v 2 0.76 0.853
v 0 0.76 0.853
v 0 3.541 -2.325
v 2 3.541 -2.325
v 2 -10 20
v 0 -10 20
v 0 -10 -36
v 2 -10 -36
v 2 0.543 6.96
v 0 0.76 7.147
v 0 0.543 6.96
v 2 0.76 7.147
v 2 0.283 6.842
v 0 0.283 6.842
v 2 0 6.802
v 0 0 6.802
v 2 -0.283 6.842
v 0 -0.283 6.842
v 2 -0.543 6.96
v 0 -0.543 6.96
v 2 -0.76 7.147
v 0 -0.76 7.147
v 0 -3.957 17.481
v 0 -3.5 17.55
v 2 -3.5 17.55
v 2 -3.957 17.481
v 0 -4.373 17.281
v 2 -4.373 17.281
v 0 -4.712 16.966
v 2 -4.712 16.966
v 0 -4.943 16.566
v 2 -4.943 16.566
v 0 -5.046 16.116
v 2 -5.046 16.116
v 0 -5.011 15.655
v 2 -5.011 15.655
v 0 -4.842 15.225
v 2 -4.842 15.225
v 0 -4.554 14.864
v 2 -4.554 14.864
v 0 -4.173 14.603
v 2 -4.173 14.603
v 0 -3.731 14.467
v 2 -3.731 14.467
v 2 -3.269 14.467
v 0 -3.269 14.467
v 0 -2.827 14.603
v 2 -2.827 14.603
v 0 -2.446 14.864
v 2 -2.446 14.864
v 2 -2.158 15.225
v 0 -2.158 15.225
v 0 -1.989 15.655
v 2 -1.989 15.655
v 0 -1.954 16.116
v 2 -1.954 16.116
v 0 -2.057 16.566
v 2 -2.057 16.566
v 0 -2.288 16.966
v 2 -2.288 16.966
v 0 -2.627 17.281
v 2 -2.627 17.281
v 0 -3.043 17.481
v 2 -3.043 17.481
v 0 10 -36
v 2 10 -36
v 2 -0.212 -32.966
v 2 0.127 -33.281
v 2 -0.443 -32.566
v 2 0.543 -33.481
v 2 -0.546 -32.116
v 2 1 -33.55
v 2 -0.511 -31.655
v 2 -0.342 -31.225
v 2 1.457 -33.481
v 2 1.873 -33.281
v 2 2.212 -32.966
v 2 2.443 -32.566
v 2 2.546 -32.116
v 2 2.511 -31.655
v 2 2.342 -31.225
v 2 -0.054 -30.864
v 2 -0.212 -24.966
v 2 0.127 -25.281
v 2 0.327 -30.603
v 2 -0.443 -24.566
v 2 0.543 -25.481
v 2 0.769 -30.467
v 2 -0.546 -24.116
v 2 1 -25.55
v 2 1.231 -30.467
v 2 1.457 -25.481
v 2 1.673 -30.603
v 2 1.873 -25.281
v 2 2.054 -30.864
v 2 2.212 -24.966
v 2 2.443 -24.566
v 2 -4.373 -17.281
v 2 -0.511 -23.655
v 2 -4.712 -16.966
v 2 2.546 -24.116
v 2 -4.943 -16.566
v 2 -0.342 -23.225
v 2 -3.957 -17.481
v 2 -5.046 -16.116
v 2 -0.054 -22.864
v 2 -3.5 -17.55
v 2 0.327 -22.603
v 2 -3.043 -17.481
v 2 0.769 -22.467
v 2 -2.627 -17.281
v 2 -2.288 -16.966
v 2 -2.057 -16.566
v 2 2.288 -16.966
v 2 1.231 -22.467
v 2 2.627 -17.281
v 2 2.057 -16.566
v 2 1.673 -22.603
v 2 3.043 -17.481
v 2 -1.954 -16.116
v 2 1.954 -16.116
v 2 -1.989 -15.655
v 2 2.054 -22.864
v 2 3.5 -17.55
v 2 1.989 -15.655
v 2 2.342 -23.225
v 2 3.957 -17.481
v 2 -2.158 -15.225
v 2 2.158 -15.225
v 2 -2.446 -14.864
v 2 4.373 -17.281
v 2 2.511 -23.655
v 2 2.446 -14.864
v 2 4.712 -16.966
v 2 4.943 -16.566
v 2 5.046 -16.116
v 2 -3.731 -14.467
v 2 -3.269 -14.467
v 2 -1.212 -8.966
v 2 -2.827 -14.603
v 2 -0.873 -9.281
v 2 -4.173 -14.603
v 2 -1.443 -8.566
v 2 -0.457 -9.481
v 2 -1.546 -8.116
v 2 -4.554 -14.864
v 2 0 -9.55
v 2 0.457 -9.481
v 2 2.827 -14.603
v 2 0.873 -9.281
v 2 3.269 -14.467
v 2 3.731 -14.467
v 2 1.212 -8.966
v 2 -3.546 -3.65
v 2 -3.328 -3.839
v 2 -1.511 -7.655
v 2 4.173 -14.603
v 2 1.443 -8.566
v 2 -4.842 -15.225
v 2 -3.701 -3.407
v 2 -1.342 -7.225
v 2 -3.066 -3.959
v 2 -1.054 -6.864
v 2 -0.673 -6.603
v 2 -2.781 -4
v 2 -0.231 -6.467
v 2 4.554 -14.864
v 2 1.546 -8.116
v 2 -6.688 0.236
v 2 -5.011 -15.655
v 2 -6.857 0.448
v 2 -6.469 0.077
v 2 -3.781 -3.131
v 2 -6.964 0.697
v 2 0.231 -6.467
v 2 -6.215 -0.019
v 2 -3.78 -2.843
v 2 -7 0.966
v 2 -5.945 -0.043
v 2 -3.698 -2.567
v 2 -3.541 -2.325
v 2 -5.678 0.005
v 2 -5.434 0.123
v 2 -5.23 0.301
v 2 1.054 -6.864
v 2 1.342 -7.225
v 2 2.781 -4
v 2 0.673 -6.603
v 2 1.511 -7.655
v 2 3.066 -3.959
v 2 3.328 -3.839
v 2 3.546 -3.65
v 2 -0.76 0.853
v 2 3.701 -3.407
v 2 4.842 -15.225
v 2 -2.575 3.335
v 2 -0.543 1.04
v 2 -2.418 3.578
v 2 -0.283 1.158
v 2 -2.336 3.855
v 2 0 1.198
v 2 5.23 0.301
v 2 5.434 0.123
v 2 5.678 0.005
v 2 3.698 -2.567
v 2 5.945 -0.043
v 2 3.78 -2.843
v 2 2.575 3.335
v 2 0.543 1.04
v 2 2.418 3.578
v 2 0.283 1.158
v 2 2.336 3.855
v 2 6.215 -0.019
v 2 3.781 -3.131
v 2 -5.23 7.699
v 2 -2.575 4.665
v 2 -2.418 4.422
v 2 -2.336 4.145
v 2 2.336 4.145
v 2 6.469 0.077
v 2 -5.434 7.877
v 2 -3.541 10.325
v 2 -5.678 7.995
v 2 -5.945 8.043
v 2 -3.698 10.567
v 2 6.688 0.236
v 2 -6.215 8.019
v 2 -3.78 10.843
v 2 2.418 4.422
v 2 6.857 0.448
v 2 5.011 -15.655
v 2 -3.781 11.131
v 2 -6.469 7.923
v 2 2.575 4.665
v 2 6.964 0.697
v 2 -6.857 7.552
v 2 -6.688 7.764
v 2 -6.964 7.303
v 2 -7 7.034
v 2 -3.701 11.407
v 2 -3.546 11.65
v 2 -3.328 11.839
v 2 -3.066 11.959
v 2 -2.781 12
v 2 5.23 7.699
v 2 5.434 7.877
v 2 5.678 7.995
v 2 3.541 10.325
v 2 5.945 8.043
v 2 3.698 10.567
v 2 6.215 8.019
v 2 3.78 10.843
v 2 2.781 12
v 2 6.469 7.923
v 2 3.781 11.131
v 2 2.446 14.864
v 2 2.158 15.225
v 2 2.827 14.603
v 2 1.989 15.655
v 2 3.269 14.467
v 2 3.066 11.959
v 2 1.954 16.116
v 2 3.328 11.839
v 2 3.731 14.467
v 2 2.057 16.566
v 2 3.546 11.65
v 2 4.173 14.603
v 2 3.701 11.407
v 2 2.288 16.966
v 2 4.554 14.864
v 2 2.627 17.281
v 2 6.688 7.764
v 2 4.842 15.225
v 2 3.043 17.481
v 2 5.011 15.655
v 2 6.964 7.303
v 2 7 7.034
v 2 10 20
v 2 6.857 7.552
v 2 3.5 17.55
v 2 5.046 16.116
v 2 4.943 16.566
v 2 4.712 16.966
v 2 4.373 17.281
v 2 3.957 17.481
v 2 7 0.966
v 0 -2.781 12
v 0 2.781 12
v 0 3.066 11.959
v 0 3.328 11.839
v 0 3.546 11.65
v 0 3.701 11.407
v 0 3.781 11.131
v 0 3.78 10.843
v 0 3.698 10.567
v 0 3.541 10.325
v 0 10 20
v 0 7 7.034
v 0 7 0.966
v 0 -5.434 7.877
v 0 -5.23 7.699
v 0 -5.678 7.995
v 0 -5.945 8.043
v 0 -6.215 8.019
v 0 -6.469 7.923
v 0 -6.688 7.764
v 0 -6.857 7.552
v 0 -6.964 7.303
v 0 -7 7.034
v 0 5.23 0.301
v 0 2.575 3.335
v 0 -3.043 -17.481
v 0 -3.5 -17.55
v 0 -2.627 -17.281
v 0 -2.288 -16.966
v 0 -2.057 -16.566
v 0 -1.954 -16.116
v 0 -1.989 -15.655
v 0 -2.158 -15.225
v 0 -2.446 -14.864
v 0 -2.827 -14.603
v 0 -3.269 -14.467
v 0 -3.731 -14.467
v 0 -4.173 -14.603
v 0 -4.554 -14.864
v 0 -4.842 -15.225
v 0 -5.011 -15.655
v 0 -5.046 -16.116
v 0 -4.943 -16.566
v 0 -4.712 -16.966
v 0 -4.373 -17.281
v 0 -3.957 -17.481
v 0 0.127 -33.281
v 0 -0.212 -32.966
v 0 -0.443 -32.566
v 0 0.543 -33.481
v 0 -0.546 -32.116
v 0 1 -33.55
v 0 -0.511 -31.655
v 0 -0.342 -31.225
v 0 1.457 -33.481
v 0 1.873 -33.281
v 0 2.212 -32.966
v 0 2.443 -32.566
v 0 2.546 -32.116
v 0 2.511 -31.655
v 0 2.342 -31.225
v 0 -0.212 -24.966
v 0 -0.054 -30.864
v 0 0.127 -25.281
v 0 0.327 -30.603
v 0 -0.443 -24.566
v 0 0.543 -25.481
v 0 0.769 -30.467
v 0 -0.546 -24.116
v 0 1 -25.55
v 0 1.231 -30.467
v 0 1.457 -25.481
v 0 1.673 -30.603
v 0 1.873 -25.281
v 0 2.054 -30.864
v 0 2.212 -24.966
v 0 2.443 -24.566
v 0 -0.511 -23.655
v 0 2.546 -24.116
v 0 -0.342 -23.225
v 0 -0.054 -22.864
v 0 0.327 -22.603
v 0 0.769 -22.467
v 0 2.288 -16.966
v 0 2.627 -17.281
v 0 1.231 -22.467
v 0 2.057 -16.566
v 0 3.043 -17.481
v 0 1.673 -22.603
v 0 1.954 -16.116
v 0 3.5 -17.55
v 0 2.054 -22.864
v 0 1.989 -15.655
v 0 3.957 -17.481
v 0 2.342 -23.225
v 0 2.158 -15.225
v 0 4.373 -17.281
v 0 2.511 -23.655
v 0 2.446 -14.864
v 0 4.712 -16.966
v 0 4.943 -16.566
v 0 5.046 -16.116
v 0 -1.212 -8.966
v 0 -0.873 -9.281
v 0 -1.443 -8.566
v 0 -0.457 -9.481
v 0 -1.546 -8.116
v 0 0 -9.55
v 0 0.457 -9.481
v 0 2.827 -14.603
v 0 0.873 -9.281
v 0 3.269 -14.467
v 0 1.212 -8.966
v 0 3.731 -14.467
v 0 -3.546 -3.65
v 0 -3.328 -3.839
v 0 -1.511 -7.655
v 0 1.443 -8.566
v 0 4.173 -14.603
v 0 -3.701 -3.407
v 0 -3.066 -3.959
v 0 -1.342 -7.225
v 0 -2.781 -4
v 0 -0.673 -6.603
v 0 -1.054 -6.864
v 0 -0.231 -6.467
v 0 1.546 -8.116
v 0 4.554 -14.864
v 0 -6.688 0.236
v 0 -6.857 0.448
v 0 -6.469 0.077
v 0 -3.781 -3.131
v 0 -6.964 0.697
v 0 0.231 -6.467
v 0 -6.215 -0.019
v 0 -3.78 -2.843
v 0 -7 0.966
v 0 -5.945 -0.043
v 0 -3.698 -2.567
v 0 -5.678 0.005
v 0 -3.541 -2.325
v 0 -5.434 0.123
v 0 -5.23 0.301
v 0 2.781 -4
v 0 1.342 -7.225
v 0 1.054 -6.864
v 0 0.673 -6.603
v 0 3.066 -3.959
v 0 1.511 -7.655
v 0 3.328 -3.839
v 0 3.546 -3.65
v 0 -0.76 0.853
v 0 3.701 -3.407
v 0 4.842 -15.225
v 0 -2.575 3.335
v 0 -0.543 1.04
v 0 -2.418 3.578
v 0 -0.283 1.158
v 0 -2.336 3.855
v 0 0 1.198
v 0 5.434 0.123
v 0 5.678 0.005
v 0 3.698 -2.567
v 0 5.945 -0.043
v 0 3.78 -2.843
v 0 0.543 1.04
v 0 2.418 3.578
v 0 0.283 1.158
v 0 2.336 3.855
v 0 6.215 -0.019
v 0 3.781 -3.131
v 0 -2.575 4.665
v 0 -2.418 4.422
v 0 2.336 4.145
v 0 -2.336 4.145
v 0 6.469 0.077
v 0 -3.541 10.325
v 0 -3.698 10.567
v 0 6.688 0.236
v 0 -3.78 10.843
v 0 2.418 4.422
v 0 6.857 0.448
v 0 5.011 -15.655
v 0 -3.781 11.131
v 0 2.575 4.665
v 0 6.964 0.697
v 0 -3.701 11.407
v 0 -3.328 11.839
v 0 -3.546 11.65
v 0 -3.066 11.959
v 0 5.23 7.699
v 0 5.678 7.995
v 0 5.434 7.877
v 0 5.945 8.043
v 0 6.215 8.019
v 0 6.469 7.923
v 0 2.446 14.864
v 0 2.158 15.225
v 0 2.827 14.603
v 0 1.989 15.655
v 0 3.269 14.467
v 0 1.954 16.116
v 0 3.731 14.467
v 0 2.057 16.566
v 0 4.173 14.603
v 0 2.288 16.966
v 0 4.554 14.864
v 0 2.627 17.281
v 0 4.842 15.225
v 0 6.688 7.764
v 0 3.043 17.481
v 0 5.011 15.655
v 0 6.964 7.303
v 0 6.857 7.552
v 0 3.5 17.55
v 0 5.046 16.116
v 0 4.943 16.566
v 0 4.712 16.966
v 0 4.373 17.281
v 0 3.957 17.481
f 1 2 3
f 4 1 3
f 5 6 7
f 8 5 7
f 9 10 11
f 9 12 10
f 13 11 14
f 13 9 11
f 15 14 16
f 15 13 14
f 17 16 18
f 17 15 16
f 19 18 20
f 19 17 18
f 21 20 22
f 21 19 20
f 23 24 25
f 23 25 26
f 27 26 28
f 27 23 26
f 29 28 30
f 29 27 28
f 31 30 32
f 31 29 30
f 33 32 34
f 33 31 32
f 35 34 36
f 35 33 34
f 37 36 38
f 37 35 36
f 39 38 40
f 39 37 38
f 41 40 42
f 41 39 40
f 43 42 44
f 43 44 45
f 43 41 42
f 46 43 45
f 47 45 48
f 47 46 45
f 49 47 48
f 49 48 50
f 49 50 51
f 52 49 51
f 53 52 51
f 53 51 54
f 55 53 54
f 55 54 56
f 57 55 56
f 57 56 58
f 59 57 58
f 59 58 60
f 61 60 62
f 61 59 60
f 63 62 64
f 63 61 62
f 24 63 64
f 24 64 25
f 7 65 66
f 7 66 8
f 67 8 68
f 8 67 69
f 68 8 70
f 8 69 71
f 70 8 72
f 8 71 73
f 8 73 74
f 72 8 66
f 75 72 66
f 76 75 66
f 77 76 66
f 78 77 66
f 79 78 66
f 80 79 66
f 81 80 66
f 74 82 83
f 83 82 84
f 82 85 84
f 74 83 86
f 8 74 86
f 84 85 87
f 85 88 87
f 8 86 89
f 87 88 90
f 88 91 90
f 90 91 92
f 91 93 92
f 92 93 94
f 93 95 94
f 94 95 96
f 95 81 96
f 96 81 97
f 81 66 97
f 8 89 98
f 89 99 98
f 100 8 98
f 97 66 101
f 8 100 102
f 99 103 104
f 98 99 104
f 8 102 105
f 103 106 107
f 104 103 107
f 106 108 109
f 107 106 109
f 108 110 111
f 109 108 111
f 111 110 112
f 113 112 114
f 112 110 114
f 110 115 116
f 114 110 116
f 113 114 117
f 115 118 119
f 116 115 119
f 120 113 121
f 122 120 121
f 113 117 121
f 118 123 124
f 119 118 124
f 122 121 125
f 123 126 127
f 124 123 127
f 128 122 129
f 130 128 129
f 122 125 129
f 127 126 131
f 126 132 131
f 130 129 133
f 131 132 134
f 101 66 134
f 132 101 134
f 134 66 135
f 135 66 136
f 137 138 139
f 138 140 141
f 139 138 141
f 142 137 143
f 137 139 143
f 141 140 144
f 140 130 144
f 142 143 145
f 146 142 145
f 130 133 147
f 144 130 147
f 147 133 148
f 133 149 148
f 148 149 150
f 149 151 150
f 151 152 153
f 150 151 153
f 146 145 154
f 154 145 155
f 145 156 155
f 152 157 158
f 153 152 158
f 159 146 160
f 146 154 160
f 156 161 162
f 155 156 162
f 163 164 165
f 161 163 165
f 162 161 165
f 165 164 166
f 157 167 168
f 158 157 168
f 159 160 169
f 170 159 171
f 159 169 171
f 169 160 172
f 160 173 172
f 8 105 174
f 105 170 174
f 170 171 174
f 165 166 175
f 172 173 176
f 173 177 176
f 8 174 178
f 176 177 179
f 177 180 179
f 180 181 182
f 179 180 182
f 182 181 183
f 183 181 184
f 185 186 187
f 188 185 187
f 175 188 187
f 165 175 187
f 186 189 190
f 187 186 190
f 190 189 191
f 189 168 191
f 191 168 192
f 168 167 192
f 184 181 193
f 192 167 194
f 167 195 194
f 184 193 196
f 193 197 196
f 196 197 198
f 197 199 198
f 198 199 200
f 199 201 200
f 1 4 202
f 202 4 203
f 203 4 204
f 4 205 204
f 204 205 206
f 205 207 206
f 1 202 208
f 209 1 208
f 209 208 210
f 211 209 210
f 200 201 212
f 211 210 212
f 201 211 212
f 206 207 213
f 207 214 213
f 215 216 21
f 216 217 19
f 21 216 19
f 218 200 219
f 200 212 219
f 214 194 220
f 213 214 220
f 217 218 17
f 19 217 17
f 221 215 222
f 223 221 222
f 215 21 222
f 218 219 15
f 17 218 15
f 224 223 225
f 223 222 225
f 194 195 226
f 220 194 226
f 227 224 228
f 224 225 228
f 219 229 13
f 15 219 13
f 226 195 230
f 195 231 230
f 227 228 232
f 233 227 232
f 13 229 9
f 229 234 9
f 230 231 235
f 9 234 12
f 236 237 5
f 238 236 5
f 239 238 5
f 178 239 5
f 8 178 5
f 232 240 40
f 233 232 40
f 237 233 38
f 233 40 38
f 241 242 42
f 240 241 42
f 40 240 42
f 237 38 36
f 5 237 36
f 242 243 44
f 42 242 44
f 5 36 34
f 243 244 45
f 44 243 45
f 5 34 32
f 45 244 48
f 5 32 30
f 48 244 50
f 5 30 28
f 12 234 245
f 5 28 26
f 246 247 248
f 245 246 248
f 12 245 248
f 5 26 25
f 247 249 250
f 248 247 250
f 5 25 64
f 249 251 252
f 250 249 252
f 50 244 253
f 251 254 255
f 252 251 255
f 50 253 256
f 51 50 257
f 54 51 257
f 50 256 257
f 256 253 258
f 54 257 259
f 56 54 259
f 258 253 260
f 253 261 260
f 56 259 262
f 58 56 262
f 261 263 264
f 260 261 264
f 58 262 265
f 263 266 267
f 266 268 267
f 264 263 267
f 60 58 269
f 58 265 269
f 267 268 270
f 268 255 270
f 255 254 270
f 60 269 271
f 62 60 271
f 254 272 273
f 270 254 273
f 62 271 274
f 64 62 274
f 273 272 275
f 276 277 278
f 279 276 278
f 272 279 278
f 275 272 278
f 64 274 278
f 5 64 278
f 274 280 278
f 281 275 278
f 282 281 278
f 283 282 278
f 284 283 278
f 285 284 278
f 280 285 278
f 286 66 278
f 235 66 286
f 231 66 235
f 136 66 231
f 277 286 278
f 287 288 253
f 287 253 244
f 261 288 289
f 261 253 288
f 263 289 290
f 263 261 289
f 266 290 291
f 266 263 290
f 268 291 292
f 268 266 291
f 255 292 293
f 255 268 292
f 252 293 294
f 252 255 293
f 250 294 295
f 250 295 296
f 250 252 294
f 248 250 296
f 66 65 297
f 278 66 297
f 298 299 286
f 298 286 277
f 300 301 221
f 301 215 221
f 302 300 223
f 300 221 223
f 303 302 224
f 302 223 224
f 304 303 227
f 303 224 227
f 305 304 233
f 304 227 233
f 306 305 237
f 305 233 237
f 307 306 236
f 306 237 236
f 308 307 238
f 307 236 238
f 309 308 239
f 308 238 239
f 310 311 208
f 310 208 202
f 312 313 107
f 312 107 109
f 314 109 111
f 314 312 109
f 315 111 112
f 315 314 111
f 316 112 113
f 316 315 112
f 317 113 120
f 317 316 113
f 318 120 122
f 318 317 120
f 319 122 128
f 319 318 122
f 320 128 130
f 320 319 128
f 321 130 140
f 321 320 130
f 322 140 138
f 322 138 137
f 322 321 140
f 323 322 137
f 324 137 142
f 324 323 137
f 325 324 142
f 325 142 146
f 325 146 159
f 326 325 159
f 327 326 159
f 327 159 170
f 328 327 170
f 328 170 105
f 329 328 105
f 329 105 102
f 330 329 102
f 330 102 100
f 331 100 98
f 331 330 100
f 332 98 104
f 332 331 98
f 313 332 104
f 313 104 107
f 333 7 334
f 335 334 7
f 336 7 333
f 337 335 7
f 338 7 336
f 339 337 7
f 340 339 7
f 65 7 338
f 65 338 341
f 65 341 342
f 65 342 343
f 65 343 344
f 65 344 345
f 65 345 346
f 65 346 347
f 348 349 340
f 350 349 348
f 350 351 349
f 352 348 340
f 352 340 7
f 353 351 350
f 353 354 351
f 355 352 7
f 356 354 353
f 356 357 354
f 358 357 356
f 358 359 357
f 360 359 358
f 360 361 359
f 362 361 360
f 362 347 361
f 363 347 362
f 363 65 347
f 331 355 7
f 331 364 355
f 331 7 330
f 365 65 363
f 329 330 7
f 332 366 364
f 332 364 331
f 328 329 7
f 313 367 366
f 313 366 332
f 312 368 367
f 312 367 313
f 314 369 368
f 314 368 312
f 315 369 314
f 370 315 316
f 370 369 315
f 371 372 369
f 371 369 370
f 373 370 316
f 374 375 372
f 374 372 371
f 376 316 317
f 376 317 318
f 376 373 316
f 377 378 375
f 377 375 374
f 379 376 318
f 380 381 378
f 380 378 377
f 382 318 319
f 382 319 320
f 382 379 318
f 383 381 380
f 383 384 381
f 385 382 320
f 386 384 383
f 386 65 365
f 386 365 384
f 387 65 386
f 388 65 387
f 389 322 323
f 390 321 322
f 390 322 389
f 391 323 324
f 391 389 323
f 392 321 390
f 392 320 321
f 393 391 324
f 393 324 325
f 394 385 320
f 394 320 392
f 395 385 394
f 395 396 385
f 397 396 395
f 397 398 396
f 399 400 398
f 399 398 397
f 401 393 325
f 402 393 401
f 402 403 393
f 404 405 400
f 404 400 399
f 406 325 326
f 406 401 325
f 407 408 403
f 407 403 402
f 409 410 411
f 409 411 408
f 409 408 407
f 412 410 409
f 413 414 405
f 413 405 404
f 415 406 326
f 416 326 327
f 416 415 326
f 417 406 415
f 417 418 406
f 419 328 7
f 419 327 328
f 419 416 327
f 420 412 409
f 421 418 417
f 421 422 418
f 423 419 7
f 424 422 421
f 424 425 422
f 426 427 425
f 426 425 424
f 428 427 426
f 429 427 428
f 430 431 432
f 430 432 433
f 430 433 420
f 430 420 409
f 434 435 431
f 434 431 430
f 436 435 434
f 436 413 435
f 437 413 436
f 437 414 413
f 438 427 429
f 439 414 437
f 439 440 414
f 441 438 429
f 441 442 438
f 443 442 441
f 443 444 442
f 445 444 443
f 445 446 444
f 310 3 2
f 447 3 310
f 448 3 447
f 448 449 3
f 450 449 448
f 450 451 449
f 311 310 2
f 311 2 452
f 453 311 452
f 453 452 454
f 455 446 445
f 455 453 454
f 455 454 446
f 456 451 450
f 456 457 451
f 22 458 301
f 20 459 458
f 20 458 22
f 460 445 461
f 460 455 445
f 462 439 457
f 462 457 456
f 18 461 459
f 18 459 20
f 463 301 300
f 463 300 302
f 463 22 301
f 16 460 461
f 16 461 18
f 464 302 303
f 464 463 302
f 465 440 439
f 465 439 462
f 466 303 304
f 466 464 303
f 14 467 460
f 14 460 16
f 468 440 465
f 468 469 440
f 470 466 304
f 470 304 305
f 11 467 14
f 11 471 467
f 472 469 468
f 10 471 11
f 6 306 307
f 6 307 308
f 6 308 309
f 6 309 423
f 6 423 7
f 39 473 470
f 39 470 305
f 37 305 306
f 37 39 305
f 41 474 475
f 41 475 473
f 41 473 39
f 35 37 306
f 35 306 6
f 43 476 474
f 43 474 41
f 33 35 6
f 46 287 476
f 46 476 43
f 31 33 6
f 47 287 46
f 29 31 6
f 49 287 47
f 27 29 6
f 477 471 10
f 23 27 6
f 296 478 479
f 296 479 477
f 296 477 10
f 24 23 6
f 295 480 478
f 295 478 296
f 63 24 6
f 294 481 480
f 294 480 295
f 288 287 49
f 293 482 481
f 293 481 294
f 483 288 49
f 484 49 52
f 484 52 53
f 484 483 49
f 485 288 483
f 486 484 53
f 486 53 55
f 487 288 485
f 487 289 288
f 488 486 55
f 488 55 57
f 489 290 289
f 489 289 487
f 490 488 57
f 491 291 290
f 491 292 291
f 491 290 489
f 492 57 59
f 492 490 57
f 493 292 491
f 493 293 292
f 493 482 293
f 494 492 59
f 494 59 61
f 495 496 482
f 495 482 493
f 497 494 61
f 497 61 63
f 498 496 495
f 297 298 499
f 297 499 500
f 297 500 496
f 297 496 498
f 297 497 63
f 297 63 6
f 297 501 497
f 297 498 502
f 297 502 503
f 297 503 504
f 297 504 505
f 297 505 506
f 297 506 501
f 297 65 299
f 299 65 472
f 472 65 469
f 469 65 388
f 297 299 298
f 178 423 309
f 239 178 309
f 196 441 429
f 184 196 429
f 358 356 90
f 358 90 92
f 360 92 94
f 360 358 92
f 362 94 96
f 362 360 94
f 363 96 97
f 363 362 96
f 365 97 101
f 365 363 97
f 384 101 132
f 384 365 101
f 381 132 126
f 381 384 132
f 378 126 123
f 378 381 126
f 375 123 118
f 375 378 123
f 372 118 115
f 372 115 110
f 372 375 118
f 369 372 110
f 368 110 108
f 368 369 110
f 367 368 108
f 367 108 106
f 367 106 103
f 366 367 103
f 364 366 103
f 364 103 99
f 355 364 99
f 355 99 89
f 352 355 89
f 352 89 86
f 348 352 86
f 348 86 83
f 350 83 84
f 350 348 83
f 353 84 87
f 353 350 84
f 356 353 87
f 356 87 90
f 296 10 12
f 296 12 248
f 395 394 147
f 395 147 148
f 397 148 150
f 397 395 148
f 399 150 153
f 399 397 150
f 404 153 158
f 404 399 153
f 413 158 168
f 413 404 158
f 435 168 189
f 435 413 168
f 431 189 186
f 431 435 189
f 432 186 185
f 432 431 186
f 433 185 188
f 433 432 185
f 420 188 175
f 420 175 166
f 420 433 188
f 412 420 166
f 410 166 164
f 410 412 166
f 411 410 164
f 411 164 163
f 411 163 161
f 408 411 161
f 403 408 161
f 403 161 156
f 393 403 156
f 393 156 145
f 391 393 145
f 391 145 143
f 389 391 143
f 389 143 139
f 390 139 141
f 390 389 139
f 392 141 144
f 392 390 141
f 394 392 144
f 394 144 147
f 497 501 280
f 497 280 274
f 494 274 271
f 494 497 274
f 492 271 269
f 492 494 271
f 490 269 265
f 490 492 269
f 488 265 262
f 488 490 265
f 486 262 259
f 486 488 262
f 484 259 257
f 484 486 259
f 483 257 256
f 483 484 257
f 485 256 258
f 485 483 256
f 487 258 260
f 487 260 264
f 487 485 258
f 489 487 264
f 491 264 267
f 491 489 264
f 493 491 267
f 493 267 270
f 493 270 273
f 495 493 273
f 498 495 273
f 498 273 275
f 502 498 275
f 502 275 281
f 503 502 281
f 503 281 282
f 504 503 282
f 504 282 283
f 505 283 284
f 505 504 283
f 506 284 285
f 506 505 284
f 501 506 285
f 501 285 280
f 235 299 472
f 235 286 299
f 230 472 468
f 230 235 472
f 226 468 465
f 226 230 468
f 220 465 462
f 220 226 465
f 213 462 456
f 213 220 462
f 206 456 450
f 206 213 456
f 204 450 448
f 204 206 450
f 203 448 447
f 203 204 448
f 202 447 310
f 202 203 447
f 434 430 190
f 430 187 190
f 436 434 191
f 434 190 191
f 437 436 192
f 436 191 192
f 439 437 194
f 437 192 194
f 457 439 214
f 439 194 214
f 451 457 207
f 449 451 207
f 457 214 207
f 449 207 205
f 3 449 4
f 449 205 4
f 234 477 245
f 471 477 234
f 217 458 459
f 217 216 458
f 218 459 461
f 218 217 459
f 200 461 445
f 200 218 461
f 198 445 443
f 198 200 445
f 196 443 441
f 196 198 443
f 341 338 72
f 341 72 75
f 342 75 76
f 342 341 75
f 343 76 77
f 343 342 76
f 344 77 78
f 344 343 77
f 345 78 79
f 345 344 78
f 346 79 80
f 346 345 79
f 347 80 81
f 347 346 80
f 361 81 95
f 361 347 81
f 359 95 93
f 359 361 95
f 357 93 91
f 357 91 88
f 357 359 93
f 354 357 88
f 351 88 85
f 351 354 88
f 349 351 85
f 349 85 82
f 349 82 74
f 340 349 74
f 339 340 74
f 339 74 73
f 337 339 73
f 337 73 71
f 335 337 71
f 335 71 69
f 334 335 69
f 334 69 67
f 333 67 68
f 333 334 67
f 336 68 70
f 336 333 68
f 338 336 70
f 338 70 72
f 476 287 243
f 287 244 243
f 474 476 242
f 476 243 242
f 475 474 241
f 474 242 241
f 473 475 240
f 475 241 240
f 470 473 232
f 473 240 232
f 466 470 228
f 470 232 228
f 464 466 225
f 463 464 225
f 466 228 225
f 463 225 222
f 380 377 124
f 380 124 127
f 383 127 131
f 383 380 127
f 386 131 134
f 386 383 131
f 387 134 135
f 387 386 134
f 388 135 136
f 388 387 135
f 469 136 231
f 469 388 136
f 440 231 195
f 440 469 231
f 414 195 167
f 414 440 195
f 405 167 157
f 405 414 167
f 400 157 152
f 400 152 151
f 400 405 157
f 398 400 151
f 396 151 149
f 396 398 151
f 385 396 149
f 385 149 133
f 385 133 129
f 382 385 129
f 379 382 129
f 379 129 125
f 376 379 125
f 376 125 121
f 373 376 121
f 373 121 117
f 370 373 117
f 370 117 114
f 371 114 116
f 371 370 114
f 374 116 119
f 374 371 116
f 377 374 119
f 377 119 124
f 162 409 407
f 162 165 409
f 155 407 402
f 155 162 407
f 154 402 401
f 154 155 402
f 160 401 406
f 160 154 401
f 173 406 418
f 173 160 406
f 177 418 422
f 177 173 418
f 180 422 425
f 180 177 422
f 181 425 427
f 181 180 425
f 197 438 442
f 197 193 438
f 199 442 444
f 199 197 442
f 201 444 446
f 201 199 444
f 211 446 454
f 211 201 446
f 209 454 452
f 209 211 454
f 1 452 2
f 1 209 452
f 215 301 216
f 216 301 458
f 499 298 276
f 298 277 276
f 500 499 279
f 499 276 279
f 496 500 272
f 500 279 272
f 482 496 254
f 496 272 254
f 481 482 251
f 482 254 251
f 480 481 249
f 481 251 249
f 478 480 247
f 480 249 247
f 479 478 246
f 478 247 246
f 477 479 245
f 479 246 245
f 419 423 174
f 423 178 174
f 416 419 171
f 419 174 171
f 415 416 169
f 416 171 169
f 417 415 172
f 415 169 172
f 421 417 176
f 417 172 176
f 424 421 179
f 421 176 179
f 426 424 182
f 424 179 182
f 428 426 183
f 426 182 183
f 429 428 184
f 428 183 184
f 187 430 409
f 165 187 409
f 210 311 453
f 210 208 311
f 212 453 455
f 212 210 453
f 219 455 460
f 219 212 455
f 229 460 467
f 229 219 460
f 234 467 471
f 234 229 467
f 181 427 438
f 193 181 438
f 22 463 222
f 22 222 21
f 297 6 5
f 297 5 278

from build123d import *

# Parameters (mm, degrees)
SKETCH_1_R      = 1.55
EXTRUDE_1_DEPTH = 2
FILLET_1_R      = 1.01


with BuildPart() as part:
    # 草图1 → 凸台-拉伸1 (new body)
    with BuildSketch(Plane(origin=(0, 0, 0), x_dir=(0, 0, -1), z_dir=(1, 0, 0))):
        Polygon((20, -10), (-20, -10), (-20, 10), (20, 10), (36, 10), (36, -10), align=None)
        with Locations((8, 0)):
            Circle(SKETCH_1_R, mode=Mode.SUBTRACT)
        with Locations((16, 3.5)):
            Circle(SKETCH_1_R, mode=Mode.SUBTRACT)
        with Locations((16, -3.5)):
            Circle(SKETCH_1_R, mode=Mode.SUBTRACT)
        with Locations(Location((-16, -3.5, 0), (0, 0, 180))):
            Circle(SKETCH_1_R, mode=Mode.SUBTRACT)
        with Locations(Location((-16, 3.5, 0), (0, 0, 180))):
            Circle(SKETCH_1_R, mode=Mode.SUBTRACT)
        with Locations((24, 1)):
            Circle(SKETCH_1_R, mode=Mode.SUBTRACT)
        with Locations((32, 1)):
            Circle(SKETCH_1_R, mode=Mode.SUBTRACT)
        Polygon((-12, -5.00684766), (-6.277888388, 0), (-12, 5.00684766), align=None, mode=Mode.SUBTRACT)
        Polygon((-9.722111612, -7), (-4, -1.99315234), (1.722111612, -7), align=None, mode=Mode.SUBTRACT)
        Polygon((-9.722111612, 7), (-4, 1.99315234), (1.722111612, 7), align=None, mode=Mode.SUBTRACT)
        Polygon((4, 5.00684766), (4, -5.00684766), (-1.722111612, 0), align=None, mode=Mode.SUBTRACT)
    extrude(amount=EXTRUDE_1_DEPTH)

    # 圆角1
    fillet_1_edges = [part.edges().sort_by_distance(p)[0] for p in [
        (1, 7, -1.722111612),
        (1, 7, 9.722111612),
        (1, 1.99315234, 4),
        (1, 5.00684766, 12),
        (1, -5.00684766, 12),
        (1, 0, 6.277888388),
        (1, -7, 9.722111612),
        (1, -7, -1.722111612),
        (1, -1.99315234, 4),
        (1, 5.00684766, -4),
        (1, 0, 1.722111612),
        (1, -5.00684766, -4),
    ]]
    fillet(fillet_1_edges, radius=FILLET_1_R)


solid = part.part
